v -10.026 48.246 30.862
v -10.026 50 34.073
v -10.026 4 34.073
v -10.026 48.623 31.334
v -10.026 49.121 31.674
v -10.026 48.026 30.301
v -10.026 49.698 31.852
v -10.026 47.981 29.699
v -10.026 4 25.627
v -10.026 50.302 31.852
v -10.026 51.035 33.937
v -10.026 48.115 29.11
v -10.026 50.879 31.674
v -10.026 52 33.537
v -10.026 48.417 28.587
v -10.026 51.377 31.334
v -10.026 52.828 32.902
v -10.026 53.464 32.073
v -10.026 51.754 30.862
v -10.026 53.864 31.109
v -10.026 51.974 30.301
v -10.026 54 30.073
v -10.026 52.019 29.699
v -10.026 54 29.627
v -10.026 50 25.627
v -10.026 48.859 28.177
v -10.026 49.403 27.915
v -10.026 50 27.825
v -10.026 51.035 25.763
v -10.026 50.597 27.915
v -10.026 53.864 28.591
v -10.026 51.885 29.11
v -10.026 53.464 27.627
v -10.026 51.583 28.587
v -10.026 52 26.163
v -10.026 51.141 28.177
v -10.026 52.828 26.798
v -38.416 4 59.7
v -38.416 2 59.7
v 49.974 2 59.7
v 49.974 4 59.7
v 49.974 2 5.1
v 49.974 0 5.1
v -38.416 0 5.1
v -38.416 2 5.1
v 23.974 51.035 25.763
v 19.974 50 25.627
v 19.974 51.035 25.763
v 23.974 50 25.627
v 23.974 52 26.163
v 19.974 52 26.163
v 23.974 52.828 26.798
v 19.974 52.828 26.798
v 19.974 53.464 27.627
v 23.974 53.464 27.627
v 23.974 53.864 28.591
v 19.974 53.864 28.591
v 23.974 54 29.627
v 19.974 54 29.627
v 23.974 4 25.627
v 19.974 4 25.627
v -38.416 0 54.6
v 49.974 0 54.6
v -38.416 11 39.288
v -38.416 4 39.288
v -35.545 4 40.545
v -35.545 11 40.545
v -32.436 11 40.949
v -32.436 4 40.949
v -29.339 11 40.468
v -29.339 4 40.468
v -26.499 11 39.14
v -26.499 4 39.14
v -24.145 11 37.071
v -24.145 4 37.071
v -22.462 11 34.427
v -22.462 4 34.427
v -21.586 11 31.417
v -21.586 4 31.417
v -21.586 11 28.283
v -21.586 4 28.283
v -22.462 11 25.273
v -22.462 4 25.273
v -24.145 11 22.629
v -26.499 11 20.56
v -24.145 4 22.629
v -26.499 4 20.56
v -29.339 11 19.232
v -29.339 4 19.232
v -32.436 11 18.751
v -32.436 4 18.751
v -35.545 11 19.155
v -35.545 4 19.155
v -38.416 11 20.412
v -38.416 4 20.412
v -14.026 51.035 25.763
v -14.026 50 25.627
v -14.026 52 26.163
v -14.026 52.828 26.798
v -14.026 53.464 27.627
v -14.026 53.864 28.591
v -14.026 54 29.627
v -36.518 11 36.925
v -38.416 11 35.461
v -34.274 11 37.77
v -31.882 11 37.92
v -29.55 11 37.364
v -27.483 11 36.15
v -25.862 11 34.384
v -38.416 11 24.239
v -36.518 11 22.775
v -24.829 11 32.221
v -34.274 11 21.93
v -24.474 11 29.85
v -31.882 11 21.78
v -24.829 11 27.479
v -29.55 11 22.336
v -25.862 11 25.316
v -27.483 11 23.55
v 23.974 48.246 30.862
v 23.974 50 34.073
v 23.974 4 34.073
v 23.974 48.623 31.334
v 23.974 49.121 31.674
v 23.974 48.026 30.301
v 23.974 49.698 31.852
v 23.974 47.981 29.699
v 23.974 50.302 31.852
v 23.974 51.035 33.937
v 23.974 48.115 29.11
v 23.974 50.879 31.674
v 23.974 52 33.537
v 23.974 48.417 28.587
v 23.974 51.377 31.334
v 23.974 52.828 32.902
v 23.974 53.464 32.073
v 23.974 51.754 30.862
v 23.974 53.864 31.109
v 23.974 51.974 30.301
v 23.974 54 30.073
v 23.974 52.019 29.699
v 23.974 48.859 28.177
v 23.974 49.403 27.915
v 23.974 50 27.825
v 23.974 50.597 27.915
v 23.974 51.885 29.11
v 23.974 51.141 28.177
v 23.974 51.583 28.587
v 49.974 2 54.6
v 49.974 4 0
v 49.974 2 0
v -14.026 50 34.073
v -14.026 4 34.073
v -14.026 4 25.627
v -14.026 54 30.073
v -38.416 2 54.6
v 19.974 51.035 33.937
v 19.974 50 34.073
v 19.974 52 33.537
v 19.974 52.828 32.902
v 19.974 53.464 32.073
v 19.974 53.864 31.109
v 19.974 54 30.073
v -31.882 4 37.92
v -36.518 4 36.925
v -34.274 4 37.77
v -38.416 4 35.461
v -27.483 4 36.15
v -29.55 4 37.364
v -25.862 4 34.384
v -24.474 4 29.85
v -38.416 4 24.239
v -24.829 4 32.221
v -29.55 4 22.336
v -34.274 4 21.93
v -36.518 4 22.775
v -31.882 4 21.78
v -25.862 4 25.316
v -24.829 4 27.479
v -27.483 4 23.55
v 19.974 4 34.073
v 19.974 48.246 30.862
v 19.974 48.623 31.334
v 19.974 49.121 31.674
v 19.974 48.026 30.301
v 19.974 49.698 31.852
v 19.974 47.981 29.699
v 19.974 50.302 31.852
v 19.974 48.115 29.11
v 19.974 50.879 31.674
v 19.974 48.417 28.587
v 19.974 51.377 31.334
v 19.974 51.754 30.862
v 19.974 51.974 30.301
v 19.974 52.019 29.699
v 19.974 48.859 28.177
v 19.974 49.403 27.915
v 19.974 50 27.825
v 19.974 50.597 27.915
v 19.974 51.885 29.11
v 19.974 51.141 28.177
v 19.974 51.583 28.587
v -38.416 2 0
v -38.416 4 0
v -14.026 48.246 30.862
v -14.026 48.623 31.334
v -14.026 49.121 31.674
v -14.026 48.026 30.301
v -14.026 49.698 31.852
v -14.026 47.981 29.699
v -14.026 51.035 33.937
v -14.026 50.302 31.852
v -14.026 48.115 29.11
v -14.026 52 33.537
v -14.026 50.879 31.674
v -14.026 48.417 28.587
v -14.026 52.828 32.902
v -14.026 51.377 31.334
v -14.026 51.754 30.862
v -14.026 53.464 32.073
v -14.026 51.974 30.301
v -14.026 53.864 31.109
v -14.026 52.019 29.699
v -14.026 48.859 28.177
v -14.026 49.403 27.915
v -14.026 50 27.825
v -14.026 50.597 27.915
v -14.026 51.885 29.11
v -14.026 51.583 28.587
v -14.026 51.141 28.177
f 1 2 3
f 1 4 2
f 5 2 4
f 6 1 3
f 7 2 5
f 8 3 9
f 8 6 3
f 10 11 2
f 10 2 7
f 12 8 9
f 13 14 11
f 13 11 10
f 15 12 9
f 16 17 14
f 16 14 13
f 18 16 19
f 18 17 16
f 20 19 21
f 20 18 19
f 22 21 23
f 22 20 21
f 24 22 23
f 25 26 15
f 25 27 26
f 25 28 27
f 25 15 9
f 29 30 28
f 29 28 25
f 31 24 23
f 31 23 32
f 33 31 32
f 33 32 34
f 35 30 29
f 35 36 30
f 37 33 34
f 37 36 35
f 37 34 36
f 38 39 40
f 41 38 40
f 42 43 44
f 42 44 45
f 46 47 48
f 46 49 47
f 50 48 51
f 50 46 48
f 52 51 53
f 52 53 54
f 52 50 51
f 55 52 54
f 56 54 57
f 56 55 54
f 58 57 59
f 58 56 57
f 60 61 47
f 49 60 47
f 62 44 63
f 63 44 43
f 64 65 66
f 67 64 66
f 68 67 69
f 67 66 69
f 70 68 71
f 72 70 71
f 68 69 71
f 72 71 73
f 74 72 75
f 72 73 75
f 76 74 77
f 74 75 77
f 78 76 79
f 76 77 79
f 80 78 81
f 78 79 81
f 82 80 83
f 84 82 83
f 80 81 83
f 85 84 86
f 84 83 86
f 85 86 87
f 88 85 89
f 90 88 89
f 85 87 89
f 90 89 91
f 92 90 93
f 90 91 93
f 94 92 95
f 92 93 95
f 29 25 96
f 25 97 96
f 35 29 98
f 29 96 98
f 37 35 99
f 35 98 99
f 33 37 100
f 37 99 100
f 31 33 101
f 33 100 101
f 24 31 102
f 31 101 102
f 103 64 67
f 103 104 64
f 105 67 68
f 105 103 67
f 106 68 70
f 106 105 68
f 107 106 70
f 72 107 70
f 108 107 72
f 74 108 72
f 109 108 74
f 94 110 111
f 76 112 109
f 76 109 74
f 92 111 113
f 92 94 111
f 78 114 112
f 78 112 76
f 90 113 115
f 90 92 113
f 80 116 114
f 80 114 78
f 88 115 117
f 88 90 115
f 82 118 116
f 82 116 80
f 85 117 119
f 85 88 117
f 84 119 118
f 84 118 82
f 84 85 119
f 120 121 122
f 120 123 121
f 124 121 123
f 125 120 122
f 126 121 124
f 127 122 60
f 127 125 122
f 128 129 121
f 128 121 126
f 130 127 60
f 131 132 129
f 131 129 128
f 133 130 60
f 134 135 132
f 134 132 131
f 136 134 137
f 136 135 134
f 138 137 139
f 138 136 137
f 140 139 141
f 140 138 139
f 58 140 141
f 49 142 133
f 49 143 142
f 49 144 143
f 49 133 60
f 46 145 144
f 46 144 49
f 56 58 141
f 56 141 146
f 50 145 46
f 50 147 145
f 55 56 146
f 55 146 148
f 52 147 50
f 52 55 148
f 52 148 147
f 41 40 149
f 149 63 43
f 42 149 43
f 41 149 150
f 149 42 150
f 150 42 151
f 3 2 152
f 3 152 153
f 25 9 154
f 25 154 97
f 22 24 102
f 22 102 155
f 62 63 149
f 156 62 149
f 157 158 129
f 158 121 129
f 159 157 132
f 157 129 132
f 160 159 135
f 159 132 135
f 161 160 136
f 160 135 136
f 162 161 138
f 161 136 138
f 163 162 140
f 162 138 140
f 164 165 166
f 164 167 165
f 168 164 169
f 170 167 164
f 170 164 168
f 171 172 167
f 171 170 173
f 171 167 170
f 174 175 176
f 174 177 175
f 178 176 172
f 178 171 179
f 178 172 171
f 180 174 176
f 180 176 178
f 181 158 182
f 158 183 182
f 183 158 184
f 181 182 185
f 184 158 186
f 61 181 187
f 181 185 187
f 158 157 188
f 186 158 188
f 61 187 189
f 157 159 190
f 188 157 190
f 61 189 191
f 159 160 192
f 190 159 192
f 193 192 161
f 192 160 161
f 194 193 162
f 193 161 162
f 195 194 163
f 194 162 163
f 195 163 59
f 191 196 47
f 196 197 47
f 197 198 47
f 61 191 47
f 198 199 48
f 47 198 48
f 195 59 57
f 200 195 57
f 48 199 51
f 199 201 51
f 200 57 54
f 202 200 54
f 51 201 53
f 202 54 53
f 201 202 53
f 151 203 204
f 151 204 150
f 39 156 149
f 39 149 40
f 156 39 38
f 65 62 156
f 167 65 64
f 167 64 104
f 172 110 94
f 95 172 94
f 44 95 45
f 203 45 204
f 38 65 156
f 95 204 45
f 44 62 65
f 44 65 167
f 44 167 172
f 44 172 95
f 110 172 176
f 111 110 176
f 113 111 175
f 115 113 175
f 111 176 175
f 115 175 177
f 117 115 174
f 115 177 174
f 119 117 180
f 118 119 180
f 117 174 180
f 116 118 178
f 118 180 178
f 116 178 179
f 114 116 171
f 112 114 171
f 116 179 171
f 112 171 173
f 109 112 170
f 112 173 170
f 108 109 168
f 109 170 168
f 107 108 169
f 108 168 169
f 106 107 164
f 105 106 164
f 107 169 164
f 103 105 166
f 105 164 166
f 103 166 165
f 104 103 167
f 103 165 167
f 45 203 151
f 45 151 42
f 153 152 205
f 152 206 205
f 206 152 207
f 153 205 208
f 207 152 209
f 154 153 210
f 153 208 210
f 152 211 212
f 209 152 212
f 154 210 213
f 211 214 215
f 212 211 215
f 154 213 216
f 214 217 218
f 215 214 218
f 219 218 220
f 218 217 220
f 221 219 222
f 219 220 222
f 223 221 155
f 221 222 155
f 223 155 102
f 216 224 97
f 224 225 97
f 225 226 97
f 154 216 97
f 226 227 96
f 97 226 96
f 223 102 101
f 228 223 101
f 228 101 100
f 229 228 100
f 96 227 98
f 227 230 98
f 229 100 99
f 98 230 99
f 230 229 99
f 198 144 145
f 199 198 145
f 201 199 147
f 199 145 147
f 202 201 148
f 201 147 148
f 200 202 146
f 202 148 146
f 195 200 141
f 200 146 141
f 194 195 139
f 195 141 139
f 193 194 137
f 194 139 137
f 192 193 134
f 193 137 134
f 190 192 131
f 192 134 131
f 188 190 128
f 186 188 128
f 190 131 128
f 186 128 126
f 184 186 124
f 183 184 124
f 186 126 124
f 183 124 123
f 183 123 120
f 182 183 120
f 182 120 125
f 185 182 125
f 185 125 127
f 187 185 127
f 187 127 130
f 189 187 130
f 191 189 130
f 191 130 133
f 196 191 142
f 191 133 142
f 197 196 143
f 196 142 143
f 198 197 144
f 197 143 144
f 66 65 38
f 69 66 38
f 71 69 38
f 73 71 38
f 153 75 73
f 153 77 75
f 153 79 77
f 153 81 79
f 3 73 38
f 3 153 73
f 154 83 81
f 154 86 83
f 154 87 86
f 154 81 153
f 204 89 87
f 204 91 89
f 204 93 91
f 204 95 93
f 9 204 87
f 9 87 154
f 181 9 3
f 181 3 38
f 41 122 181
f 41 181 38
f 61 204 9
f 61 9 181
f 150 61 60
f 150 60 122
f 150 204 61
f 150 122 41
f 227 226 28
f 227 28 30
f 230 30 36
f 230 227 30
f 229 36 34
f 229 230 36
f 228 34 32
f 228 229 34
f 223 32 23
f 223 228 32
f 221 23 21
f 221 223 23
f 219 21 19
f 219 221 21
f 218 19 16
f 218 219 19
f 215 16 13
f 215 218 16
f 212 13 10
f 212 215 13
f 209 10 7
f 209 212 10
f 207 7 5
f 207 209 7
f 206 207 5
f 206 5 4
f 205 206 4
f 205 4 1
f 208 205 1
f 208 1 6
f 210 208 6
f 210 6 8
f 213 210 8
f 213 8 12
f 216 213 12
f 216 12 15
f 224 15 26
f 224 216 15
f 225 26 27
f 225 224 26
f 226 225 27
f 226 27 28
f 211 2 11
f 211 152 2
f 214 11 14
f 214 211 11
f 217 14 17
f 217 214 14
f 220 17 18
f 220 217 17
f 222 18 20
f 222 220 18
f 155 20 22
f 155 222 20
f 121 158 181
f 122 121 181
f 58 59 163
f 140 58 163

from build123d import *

# Parameters (mm, degrees)
IZIM2_W                     = 88.39
IZIM2_H                     = 59.7
Y_KSEKLIK_EKSTR_ZYON1_DEPTH = 4
Y_KSEKLIK_EKSTR_ZYON2_DEPTH = 7
Y_KSEKLIK_EKSTR_ZYON3_DEPTH = 4
RADYUS2_R                   = 4
IZIM6_R                     = 2.025
KES_EKSTR_ZYON1_DEPTH       = 4
RADYUS2_OF_AYNALAMA1_R      = 4
IZIM10_W                    = 5.1
IZIM10_H                    = 2
KES_EKSTR_ZYON2_DEPTH       = 88.39


with BuildPart() as part:
    # Çizim2 → Yükseklik-Ekstrüzyon1 (new body)
    with BuildSketch(Plane(origin=(0, 0, 0), x_dir=(1, 0, 0), z_dir=(0, 1, 0))):
        with Locations((5.778877035, -29.85)):
            Rectangle(IZIM2_W, IZIM2_H)
    extrude(amount=Y_KSEKLIK_EKSTR_ZYON1_DEPTH)

    # Çizim3 → Yükseklik-Ekstrüzyon2 (add)
    with BuildSketch(Plane(origin=(0, 4, 0), x_dir=(1, 0, 0), z_dir=(0, 1, 0))):
        with BuildLine():
            ThreePointArc((-38.416122965, -39.288399656), (-21.474324276, -29.85), (-38.416122965, -20.411600344))
            Line((-38.416122965, -20.411600344), (-38.416122965, -24.238994023))
            ThreePointArc((-38.416122965, -24.238994023), (-24.474324276, -29.85), (-38.416122965, -35.461005977))
            Line((-38.416122965, -35.461005977), (-38.416122965, -39.288399656))
        make_face()
    extrude(amount=Y_KSEKLIK_EKSTR_ZYON2_DEPTH)

    # Çizim5 → Yükseklik-Ekstrüzyon3 (add)
    with BuildSketch(Plane(origin=(19.973877035, 0, 0), x_dir=(0, 0, -1), z_dir=(1, 0, 0))):
        Polygon((-32.003216554, 4), (-27.696783446, 4), (-25.626729832, 4), (-25.626729832, 54), (-34.073270168, 54), (-34.073270168, 4), align=None)
    y_kseklik_ekstr_zyon3 = extrude(amount=Y_KSEKLIK_EKSTR_ZYON3_DEPTH)

    # Radyus2
    radyus2_edges = [part.edges().sort_by_distance(p)[0] for p in [
        (21.973877035, 54, 25.626729832),
        (21.973877035, 54, 34.073270168),
    ]]
    fillet(radyus2_edges, radius=RADYUS2_R)

    # Çizim6 → Kes-Ekstrüzyon1 (cut)
    with BuildSketch(Plane(origin=(23.973877035, 0, 0), x_dir=(0, 0, -1), z_dir=(1, 0, 0))):
        with Locations((-29.85, 50)):
            Circle(IZIM6_R)
    kes_ekstr_zyon1 = extrude(amount=-KES_EKSTR_ZYON1_DEPTH, mode=Mode.SUBTRACT)

    # Aynalama1: Yükseklik-Ekstrüzyon3, Kes-Ekstrüzyon1 across plane
    add(y_kseklik_ekstr_zyon3.mirror(Plane(origin=(4.973877035, 0, 0), x_dir=(0, 0, 1), z_dir=(1, 0, 0))))
    add(kes_ekstr_zyon1.mirror(Plane(origin=(4.973877035, 0, 0), x_dir=(0, 0, 1), z_dir=(1, 0, 0))), mode=Mode.SUBTRACT)

    # Radyus2 of Aynalama1
    radyus2_of_aynalama1_edges = [part.edges().sort_by_distance(p)[0] for p in [
        (-12.026122965, 54, 25.626729832),
        (-12.026122965, 54, 34.073270168),
    ]]
    fillet(radyus2_of_aynalama1_edges, radius=RADYUS2_OF_AYNALAMA1_R)

    # Çizim10 → Kes-Ekstrüzyon2 (cut)
    with BuildSketch(Plane.ZY.offset(38.416122965)):
        with Locations((2.55, 1)):
            Rectangle(IZIM10_W, IZIM10_H)
        with Locations((57.15, 1)):
            Rectangle(IZIM10_W, IZIM10_H)
    extrude(amount=-KES_EKSTR_ZYON2_DEPTH, mode=Mode.SUBTRACT)


solid = part.part
